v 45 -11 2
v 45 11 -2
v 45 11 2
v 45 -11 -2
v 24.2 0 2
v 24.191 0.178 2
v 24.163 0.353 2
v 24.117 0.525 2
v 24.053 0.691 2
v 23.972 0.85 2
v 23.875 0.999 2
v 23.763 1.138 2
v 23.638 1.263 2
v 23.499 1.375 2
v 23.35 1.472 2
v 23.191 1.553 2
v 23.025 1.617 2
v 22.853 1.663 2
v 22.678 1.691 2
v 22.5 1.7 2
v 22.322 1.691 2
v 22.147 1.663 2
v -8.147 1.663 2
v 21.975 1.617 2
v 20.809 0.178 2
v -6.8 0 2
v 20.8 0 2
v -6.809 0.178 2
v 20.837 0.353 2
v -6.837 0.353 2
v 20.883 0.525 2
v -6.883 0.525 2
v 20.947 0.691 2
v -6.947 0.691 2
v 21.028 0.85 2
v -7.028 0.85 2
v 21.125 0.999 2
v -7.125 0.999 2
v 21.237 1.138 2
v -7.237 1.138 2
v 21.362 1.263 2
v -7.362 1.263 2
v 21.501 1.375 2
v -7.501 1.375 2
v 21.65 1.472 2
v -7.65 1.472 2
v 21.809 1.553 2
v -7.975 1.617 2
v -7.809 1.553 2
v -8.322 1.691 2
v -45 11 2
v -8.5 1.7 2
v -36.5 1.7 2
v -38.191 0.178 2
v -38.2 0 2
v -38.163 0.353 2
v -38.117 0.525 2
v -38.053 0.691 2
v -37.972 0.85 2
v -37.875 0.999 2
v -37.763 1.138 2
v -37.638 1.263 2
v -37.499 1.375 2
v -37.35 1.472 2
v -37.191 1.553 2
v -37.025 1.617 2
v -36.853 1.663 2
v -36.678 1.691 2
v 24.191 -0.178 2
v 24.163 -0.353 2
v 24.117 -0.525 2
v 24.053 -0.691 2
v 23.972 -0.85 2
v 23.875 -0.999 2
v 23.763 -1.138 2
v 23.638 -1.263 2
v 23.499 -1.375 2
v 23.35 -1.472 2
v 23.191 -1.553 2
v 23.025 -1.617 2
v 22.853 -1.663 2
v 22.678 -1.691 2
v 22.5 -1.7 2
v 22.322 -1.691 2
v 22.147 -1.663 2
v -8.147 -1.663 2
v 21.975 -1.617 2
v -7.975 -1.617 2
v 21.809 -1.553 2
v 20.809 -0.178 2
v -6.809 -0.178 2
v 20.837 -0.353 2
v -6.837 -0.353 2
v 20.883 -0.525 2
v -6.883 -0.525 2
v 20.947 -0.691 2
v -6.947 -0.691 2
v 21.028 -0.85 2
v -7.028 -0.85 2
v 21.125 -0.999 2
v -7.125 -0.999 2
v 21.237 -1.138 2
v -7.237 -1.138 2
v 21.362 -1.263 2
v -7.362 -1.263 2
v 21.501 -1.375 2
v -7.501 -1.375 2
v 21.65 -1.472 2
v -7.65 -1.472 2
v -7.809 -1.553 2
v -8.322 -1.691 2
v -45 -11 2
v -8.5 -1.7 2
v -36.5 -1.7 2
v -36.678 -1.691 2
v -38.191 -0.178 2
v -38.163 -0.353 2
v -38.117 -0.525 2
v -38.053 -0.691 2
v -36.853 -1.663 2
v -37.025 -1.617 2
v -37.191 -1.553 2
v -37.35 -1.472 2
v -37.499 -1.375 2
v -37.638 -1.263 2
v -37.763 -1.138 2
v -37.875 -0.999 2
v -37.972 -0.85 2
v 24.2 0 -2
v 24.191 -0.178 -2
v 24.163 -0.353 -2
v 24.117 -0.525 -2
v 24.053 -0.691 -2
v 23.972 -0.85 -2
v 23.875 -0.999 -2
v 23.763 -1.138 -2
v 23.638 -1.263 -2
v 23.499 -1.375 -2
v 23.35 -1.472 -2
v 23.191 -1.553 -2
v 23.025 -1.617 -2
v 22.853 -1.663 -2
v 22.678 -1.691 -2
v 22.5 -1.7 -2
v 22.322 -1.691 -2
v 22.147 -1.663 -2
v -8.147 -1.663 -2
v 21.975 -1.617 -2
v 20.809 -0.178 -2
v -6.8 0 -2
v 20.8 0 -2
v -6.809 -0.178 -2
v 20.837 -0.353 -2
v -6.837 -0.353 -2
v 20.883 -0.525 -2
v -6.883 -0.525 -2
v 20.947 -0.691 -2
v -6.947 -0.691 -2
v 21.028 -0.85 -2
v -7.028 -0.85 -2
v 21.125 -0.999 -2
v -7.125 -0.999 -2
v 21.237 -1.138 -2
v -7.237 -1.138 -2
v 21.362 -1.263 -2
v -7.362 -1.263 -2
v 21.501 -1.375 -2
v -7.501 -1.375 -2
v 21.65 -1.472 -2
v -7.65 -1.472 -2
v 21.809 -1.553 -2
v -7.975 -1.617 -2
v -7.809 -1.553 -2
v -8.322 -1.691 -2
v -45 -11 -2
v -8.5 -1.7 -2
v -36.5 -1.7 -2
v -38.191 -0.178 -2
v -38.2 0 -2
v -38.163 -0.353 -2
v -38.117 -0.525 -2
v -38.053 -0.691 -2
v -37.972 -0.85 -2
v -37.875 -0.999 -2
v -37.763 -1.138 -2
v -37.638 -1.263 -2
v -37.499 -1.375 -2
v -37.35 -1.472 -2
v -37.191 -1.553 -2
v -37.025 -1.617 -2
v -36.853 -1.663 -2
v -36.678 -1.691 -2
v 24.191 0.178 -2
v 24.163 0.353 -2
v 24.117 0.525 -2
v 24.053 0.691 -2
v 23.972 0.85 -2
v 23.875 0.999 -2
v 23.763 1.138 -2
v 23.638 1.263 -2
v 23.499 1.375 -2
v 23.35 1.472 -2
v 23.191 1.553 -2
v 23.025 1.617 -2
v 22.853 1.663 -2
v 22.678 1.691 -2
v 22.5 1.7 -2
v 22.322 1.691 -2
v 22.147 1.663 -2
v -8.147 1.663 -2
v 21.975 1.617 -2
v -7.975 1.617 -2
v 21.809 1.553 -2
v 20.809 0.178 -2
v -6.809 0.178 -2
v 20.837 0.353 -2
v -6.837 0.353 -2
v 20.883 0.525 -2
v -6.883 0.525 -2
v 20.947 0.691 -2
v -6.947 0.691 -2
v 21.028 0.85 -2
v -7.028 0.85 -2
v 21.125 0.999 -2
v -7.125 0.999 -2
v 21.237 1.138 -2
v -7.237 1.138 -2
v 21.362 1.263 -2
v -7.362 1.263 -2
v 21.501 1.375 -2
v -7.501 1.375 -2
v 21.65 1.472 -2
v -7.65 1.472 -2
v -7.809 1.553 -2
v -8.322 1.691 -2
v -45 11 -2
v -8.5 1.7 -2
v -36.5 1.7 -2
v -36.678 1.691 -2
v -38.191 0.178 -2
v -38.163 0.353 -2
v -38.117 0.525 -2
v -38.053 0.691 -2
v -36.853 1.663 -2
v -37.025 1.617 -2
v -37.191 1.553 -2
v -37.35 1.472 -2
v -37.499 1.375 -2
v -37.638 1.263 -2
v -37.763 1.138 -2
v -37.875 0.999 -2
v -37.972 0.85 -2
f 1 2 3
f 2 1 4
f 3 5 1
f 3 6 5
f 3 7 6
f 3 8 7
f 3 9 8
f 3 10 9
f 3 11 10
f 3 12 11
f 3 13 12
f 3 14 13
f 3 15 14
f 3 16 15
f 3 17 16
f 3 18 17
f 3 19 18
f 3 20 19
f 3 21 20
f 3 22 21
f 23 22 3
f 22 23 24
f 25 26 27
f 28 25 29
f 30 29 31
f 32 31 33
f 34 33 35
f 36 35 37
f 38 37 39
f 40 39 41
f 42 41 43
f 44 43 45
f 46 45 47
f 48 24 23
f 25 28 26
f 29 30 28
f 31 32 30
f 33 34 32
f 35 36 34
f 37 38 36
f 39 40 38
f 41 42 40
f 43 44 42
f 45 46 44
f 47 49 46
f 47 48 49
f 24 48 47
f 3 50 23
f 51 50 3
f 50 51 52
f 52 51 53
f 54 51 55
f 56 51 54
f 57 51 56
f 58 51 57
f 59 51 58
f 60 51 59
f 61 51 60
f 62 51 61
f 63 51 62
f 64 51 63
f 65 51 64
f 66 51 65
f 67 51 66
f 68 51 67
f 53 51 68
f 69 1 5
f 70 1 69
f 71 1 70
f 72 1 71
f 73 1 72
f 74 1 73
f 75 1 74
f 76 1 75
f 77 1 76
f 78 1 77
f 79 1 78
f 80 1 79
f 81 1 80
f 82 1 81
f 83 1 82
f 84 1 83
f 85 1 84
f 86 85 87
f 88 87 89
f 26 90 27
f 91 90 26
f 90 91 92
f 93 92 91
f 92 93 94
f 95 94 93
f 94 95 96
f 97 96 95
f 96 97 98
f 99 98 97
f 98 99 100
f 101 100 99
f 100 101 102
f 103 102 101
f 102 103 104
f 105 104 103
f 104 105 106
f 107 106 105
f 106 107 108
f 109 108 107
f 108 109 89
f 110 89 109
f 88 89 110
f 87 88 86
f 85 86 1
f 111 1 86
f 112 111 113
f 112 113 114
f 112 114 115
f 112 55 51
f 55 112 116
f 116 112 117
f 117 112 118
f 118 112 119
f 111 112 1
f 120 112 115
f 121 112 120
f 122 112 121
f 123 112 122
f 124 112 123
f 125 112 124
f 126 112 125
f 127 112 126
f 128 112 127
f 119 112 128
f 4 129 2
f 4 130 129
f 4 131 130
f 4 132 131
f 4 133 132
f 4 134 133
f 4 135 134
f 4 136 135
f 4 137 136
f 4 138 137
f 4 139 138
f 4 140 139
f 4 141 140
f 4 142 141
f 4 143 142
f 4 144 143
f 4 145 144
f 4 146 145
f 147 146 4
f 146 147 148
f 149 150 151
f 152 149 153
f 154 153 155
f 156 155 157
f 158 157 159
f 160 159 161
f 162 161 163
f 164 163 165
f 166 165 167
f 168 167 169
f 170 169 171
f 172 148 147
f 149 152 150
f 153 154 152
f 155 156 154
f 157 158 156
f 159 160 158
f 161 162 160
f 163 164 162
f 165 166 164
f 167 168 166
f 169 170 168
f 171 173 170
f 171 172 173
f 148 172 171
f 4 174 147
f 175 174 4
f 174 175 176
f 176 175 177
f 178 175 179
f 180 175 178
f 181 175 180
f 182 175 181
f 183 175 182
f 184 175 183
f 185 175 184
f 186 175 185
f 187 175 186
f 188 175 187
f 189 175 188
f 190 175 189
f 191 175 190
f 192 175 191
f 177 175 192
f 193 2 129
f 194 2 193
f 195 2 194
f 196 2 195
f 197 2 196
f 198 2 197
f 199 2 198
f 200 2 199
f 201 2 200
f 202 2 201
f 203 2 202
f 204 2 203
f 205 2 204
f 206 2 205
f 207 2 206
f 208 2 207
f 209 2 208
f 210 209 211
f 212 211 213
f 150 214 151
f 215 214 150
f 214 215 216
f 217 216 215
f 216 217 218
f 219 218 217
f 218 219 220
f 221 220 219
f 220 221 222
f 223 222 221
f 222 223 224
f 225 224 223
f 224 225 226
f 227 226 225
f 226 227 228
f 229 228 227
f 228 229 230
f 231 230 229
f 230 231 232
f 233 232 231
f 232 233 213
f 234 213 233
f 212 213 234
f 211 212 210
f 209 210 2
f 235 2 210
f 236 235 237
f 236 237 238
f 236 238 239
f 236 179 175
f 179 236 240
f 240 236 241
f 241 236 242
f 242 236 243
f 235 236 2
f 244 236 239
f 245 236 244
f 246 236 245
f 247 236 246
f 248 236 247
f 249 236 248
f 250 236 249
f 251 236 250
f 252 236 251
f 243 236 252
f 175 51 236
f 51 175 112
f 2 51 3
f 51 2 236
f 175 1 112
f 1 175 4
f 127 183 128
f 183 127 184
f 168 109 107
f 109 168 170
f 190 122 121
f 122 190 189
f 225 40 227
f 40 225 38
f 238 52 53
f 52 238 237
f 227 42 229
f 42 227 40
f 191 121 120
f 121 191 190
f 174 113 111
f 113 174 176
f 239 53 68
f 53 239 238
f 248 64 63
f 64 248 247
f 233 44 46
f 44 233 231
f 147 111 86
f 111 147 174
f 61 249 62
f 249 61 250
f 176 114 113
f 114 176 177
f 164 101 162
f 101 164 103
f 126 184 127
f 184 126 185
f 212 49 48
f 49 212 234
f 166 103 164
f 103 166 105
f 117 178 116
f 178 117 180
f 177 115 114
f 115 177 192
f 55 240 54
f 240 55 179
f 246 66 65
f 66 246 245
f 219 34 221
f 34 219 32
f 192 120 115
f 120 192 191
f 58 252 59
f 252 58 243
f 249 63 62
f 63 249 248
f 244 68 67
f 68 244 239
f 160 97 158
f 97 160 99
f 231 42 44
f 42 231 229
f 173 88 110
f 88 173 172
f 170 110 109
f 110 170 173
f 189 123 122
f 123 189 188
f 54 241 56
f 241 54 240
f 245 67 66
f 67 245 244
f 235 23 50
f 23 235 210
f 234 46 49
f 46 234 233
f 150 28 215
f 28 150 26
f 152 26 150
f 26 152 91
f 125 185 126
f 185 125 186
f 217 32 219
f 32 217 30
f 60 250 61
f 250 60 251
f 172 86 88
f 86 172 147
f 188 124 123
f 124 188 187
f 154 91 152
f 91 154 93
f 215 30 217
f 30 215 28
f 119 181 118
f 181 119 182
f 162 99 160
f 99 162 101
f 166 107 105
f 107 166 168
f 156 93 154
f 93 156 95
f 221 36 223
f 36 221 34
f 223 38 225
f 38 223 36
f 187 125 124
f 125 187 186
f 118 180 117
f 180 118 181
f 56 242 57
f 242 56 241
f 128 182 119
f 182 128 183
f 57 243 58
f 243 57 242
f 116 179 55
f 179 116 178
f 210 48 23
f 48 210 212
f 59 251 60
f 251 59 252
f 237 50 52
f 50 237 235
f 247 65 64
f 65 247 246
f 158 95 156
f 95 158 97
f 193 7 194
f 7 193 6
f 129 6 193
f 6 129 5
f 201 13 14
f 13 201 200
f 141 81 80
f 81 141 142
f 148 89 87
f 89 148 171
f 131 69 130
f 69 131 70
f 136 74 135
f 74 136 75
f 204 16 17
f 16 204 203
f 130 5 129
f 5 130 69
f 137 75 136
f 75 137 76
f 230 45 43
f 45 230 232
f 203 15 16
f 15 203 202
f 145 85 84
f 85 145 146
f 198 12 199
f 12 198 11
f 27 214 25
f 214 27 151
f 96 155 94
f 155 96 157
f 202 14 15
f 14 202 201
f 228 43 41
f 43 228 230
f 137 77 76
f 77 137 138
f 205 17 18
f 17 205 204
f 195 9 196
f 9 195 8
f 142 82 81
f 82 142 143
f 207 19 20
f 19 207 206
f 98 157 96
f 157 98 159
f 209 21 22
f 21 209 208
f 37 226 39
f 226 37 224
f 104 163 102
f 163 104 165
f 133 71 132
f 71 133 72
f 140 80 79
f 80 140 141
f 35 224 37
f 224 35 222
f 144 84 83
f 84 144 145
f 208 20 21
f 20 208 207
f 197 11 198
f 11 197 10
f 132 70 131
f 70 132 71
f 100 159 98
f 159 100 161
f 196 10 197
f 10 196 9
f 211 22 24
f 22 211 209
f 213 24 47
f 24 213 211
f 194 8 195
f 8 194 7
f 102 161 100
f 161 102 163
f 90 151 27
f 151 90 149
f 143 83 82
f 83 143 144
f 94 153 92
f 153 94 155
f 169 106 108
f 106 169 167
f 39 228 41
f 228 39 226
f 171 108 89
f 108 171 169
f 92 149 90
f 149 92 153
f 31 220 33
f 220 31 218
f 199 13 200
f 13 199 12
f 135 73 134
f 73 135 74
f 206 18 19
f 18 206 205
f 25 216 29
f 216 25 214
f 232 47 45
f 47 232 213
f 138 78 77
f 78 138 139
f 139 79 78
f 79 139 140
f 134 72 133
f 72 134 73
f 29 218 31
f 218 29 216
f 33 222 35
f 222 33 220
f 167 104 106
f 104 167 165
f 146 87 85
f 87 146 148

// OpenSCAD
// Adjustable sensor mounting tab.
$fn = 60;
eps = 0.02;
length = 90;
width = 22;
thickness = 4;
slot_l = 28;
module slot(x) { hull() { translate([x-slot_l/2,0,-thickness/2-eps]) cylinder(d=3.4,h=thickness+2*eps); translate([x+slot_l/2,0,-thickness/2-eps]) cylinder(d=3.4,h=thickness+2*eps); } }
difference() { cube([length,width,thickness],center=true); slot(-length/4); translate([length/4,0,-thickness/2-eps]) cylinder(d=3.4,h=thickness+2*eps); }
